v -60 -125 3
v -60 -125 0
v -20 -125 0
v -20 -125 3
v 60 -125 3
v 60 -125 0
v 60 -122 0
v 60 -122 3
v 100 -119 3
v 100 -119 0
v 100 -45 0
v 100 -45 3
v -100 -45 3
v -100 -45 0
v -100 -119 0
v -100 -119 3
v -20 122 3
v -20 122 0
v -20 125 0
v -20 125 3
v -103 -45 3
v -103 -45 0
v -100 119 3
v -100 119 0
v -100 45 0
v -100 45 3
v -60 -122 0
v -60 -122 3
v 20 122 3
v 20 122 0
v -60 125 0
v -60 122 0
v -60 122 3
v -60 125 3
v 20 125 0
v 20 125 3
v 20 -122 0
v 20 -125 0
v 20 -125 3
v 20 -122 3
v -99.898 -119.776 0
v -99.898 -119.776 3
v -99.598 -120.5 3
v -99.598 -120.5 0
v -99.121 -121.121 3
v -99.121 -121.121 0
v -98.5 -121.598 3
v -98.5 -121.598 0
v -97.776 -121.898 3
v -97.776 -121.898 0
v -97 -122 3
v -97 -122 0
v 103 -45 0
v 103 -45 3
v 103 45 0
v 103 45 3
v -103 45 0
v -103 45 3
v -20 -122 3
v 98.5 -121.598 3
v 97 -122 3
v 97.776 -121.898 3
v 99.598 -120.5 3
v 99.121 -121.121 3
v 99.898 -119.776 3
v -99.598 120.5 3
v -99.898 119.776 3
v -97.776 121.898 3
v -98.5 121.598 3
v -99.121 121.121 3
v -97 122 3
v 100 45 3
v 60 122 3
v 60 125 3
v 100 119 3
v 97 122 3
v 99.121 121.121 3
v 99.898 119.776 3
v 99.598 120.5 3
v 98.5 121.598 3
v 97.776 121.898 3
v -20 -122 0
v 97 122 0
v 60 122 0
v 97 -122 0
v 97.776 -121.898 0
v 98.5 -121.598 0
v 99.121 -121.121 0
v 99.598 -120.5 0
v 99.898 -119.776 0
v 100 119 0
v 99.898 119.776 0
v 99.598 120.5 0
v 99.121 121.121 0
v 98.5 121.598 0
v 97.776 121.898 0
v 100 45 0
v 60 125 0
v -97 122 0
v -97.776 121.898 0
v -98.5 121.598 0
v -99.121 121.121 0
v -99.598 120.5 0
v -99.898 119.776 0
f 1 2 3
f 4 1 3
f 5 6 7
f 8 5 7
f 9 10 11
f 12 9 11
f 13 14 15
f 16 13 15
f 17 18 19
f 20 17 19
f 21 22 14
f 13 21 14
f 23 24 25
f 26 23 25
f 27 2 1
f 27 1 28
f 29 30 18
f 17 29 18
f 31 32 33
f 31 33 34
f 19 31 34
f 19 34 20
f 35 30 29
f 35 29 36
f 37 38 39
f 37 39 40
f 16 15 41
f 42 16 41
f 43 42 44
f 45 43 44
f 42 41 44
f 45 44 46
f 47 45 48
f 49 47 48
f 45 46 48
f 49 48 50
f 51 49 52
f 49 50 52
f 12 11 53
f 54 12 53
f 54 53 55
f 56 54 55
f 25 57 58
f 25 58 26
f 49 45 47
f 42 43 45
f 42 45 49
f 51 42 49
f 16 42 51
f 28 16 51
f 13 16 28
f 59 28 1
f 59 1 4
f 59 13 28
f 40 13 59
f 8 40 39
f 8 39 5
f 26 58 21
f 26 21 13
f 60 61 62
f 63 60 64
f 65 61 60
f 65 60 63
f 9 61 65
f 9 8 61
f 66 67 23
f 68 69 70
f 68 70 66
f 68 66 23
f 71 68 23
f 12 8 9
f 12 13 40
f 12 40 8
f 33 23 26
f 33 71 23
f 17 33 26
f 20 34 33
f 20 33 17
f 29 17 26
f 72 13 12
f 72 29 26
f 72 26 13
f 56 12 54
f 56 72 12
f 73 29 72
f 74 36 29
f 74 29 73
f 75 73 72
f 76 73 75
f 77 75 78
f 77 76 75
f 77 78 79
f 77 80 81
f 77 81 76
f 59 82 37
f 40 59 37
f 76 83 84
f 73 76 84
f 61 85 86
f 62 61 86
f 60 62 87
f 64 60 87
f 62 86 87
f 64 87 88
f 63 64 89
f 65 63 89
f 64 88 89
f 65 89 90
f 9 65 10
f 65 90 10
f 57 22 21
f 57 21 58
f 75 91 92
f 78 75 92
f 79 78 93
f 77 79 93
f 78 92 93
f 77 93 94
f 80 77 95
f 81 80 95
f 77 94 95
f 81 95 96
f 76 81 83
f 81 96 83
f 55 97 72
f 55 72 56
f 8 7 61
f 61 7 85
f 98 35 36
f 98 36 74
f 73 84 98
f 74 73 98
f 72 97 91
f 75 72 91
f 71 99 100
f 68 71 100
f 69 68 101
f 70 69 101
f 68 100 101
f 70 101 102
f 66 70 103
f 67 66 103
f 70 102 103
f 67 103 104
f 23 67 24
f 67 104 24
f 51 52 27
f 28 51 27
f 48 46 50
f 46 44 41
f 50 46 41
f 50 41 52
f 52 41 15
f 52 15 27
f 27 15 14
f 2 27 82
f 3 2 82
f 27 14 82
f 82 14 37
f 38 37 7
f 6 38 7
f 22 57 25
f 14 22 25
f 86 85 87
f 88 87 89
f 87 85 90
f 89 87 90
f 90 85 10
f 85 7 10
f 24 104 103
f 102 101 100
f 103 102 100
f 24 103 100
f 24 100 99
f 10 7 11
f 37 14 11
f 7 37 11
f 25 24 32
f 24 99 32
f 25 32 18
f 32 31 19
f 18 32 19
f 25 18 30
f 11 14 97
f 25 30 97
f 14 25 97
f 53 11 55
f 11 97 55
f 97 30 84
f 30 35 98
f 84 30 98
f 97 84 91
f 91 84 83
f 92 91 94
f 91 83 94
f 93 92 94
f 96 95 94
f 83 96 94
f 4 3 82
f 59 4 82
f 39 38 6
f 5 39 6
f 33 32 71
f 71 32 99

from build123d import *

# Parameters (mm, degrees)
SKETCH1_W           = 40
SKETCH1_H           = 3
SKETCH1_W_2         = 3
SKETCH1_H_2         = 90
BOSS_EXTRUDE1_DEPTH = 3


with BuildPart() as part:
    # Sketch1 → Boss-Extrude1 (new body)
    with BuildSketch(Plane.XY):
        with BuildLine():
            Line((97, 122), (-97, 122))
            ThreePointArc((-97, 122), (-99.121320344, 121.121320344), (-100, 119))
            Line((-100, 119), (-100, -119))
            ThreePointArc((-100, -119), (-99.121320344, -121.121320344), (-97, -122))
            Line((-97, -122), (97, -122))
            ThreePointArc((97, -122), (99.121320344, -121.121320344), (100, -119))
            Line((100, -119), (100, 119))
            ThreePointArc((100, 119), (99.121320344, 121.121320344), (97, 122))
        make_face()
        with Locations((-40, 123.5)):
            Rectangle(SKETCH1_W, SKETCH1_H)
        with Locations((40, 123.5)):
            Rectangle(SKETCH1_W, SKETCH1_H)
        with Locations((-101.5, 0)):
            Rectangle(SKETCH1_W_2, SKETCH1_H_2)
        with Locations((101.5, 0)):
            Rectangle(SKETCH1_W_2, SKETCH1_H_2)
        with Locations((40, -123.5)):
            Rectangle(SKETCH1_W, SKETCH1_H)
        with Locations((-40, -123.5)):
            Rectangle(SKETCH1_W, SKETCH1_H)
    extrude(amount=BOSS_EXTRUDE1_DEPTH)


solid = part.part
